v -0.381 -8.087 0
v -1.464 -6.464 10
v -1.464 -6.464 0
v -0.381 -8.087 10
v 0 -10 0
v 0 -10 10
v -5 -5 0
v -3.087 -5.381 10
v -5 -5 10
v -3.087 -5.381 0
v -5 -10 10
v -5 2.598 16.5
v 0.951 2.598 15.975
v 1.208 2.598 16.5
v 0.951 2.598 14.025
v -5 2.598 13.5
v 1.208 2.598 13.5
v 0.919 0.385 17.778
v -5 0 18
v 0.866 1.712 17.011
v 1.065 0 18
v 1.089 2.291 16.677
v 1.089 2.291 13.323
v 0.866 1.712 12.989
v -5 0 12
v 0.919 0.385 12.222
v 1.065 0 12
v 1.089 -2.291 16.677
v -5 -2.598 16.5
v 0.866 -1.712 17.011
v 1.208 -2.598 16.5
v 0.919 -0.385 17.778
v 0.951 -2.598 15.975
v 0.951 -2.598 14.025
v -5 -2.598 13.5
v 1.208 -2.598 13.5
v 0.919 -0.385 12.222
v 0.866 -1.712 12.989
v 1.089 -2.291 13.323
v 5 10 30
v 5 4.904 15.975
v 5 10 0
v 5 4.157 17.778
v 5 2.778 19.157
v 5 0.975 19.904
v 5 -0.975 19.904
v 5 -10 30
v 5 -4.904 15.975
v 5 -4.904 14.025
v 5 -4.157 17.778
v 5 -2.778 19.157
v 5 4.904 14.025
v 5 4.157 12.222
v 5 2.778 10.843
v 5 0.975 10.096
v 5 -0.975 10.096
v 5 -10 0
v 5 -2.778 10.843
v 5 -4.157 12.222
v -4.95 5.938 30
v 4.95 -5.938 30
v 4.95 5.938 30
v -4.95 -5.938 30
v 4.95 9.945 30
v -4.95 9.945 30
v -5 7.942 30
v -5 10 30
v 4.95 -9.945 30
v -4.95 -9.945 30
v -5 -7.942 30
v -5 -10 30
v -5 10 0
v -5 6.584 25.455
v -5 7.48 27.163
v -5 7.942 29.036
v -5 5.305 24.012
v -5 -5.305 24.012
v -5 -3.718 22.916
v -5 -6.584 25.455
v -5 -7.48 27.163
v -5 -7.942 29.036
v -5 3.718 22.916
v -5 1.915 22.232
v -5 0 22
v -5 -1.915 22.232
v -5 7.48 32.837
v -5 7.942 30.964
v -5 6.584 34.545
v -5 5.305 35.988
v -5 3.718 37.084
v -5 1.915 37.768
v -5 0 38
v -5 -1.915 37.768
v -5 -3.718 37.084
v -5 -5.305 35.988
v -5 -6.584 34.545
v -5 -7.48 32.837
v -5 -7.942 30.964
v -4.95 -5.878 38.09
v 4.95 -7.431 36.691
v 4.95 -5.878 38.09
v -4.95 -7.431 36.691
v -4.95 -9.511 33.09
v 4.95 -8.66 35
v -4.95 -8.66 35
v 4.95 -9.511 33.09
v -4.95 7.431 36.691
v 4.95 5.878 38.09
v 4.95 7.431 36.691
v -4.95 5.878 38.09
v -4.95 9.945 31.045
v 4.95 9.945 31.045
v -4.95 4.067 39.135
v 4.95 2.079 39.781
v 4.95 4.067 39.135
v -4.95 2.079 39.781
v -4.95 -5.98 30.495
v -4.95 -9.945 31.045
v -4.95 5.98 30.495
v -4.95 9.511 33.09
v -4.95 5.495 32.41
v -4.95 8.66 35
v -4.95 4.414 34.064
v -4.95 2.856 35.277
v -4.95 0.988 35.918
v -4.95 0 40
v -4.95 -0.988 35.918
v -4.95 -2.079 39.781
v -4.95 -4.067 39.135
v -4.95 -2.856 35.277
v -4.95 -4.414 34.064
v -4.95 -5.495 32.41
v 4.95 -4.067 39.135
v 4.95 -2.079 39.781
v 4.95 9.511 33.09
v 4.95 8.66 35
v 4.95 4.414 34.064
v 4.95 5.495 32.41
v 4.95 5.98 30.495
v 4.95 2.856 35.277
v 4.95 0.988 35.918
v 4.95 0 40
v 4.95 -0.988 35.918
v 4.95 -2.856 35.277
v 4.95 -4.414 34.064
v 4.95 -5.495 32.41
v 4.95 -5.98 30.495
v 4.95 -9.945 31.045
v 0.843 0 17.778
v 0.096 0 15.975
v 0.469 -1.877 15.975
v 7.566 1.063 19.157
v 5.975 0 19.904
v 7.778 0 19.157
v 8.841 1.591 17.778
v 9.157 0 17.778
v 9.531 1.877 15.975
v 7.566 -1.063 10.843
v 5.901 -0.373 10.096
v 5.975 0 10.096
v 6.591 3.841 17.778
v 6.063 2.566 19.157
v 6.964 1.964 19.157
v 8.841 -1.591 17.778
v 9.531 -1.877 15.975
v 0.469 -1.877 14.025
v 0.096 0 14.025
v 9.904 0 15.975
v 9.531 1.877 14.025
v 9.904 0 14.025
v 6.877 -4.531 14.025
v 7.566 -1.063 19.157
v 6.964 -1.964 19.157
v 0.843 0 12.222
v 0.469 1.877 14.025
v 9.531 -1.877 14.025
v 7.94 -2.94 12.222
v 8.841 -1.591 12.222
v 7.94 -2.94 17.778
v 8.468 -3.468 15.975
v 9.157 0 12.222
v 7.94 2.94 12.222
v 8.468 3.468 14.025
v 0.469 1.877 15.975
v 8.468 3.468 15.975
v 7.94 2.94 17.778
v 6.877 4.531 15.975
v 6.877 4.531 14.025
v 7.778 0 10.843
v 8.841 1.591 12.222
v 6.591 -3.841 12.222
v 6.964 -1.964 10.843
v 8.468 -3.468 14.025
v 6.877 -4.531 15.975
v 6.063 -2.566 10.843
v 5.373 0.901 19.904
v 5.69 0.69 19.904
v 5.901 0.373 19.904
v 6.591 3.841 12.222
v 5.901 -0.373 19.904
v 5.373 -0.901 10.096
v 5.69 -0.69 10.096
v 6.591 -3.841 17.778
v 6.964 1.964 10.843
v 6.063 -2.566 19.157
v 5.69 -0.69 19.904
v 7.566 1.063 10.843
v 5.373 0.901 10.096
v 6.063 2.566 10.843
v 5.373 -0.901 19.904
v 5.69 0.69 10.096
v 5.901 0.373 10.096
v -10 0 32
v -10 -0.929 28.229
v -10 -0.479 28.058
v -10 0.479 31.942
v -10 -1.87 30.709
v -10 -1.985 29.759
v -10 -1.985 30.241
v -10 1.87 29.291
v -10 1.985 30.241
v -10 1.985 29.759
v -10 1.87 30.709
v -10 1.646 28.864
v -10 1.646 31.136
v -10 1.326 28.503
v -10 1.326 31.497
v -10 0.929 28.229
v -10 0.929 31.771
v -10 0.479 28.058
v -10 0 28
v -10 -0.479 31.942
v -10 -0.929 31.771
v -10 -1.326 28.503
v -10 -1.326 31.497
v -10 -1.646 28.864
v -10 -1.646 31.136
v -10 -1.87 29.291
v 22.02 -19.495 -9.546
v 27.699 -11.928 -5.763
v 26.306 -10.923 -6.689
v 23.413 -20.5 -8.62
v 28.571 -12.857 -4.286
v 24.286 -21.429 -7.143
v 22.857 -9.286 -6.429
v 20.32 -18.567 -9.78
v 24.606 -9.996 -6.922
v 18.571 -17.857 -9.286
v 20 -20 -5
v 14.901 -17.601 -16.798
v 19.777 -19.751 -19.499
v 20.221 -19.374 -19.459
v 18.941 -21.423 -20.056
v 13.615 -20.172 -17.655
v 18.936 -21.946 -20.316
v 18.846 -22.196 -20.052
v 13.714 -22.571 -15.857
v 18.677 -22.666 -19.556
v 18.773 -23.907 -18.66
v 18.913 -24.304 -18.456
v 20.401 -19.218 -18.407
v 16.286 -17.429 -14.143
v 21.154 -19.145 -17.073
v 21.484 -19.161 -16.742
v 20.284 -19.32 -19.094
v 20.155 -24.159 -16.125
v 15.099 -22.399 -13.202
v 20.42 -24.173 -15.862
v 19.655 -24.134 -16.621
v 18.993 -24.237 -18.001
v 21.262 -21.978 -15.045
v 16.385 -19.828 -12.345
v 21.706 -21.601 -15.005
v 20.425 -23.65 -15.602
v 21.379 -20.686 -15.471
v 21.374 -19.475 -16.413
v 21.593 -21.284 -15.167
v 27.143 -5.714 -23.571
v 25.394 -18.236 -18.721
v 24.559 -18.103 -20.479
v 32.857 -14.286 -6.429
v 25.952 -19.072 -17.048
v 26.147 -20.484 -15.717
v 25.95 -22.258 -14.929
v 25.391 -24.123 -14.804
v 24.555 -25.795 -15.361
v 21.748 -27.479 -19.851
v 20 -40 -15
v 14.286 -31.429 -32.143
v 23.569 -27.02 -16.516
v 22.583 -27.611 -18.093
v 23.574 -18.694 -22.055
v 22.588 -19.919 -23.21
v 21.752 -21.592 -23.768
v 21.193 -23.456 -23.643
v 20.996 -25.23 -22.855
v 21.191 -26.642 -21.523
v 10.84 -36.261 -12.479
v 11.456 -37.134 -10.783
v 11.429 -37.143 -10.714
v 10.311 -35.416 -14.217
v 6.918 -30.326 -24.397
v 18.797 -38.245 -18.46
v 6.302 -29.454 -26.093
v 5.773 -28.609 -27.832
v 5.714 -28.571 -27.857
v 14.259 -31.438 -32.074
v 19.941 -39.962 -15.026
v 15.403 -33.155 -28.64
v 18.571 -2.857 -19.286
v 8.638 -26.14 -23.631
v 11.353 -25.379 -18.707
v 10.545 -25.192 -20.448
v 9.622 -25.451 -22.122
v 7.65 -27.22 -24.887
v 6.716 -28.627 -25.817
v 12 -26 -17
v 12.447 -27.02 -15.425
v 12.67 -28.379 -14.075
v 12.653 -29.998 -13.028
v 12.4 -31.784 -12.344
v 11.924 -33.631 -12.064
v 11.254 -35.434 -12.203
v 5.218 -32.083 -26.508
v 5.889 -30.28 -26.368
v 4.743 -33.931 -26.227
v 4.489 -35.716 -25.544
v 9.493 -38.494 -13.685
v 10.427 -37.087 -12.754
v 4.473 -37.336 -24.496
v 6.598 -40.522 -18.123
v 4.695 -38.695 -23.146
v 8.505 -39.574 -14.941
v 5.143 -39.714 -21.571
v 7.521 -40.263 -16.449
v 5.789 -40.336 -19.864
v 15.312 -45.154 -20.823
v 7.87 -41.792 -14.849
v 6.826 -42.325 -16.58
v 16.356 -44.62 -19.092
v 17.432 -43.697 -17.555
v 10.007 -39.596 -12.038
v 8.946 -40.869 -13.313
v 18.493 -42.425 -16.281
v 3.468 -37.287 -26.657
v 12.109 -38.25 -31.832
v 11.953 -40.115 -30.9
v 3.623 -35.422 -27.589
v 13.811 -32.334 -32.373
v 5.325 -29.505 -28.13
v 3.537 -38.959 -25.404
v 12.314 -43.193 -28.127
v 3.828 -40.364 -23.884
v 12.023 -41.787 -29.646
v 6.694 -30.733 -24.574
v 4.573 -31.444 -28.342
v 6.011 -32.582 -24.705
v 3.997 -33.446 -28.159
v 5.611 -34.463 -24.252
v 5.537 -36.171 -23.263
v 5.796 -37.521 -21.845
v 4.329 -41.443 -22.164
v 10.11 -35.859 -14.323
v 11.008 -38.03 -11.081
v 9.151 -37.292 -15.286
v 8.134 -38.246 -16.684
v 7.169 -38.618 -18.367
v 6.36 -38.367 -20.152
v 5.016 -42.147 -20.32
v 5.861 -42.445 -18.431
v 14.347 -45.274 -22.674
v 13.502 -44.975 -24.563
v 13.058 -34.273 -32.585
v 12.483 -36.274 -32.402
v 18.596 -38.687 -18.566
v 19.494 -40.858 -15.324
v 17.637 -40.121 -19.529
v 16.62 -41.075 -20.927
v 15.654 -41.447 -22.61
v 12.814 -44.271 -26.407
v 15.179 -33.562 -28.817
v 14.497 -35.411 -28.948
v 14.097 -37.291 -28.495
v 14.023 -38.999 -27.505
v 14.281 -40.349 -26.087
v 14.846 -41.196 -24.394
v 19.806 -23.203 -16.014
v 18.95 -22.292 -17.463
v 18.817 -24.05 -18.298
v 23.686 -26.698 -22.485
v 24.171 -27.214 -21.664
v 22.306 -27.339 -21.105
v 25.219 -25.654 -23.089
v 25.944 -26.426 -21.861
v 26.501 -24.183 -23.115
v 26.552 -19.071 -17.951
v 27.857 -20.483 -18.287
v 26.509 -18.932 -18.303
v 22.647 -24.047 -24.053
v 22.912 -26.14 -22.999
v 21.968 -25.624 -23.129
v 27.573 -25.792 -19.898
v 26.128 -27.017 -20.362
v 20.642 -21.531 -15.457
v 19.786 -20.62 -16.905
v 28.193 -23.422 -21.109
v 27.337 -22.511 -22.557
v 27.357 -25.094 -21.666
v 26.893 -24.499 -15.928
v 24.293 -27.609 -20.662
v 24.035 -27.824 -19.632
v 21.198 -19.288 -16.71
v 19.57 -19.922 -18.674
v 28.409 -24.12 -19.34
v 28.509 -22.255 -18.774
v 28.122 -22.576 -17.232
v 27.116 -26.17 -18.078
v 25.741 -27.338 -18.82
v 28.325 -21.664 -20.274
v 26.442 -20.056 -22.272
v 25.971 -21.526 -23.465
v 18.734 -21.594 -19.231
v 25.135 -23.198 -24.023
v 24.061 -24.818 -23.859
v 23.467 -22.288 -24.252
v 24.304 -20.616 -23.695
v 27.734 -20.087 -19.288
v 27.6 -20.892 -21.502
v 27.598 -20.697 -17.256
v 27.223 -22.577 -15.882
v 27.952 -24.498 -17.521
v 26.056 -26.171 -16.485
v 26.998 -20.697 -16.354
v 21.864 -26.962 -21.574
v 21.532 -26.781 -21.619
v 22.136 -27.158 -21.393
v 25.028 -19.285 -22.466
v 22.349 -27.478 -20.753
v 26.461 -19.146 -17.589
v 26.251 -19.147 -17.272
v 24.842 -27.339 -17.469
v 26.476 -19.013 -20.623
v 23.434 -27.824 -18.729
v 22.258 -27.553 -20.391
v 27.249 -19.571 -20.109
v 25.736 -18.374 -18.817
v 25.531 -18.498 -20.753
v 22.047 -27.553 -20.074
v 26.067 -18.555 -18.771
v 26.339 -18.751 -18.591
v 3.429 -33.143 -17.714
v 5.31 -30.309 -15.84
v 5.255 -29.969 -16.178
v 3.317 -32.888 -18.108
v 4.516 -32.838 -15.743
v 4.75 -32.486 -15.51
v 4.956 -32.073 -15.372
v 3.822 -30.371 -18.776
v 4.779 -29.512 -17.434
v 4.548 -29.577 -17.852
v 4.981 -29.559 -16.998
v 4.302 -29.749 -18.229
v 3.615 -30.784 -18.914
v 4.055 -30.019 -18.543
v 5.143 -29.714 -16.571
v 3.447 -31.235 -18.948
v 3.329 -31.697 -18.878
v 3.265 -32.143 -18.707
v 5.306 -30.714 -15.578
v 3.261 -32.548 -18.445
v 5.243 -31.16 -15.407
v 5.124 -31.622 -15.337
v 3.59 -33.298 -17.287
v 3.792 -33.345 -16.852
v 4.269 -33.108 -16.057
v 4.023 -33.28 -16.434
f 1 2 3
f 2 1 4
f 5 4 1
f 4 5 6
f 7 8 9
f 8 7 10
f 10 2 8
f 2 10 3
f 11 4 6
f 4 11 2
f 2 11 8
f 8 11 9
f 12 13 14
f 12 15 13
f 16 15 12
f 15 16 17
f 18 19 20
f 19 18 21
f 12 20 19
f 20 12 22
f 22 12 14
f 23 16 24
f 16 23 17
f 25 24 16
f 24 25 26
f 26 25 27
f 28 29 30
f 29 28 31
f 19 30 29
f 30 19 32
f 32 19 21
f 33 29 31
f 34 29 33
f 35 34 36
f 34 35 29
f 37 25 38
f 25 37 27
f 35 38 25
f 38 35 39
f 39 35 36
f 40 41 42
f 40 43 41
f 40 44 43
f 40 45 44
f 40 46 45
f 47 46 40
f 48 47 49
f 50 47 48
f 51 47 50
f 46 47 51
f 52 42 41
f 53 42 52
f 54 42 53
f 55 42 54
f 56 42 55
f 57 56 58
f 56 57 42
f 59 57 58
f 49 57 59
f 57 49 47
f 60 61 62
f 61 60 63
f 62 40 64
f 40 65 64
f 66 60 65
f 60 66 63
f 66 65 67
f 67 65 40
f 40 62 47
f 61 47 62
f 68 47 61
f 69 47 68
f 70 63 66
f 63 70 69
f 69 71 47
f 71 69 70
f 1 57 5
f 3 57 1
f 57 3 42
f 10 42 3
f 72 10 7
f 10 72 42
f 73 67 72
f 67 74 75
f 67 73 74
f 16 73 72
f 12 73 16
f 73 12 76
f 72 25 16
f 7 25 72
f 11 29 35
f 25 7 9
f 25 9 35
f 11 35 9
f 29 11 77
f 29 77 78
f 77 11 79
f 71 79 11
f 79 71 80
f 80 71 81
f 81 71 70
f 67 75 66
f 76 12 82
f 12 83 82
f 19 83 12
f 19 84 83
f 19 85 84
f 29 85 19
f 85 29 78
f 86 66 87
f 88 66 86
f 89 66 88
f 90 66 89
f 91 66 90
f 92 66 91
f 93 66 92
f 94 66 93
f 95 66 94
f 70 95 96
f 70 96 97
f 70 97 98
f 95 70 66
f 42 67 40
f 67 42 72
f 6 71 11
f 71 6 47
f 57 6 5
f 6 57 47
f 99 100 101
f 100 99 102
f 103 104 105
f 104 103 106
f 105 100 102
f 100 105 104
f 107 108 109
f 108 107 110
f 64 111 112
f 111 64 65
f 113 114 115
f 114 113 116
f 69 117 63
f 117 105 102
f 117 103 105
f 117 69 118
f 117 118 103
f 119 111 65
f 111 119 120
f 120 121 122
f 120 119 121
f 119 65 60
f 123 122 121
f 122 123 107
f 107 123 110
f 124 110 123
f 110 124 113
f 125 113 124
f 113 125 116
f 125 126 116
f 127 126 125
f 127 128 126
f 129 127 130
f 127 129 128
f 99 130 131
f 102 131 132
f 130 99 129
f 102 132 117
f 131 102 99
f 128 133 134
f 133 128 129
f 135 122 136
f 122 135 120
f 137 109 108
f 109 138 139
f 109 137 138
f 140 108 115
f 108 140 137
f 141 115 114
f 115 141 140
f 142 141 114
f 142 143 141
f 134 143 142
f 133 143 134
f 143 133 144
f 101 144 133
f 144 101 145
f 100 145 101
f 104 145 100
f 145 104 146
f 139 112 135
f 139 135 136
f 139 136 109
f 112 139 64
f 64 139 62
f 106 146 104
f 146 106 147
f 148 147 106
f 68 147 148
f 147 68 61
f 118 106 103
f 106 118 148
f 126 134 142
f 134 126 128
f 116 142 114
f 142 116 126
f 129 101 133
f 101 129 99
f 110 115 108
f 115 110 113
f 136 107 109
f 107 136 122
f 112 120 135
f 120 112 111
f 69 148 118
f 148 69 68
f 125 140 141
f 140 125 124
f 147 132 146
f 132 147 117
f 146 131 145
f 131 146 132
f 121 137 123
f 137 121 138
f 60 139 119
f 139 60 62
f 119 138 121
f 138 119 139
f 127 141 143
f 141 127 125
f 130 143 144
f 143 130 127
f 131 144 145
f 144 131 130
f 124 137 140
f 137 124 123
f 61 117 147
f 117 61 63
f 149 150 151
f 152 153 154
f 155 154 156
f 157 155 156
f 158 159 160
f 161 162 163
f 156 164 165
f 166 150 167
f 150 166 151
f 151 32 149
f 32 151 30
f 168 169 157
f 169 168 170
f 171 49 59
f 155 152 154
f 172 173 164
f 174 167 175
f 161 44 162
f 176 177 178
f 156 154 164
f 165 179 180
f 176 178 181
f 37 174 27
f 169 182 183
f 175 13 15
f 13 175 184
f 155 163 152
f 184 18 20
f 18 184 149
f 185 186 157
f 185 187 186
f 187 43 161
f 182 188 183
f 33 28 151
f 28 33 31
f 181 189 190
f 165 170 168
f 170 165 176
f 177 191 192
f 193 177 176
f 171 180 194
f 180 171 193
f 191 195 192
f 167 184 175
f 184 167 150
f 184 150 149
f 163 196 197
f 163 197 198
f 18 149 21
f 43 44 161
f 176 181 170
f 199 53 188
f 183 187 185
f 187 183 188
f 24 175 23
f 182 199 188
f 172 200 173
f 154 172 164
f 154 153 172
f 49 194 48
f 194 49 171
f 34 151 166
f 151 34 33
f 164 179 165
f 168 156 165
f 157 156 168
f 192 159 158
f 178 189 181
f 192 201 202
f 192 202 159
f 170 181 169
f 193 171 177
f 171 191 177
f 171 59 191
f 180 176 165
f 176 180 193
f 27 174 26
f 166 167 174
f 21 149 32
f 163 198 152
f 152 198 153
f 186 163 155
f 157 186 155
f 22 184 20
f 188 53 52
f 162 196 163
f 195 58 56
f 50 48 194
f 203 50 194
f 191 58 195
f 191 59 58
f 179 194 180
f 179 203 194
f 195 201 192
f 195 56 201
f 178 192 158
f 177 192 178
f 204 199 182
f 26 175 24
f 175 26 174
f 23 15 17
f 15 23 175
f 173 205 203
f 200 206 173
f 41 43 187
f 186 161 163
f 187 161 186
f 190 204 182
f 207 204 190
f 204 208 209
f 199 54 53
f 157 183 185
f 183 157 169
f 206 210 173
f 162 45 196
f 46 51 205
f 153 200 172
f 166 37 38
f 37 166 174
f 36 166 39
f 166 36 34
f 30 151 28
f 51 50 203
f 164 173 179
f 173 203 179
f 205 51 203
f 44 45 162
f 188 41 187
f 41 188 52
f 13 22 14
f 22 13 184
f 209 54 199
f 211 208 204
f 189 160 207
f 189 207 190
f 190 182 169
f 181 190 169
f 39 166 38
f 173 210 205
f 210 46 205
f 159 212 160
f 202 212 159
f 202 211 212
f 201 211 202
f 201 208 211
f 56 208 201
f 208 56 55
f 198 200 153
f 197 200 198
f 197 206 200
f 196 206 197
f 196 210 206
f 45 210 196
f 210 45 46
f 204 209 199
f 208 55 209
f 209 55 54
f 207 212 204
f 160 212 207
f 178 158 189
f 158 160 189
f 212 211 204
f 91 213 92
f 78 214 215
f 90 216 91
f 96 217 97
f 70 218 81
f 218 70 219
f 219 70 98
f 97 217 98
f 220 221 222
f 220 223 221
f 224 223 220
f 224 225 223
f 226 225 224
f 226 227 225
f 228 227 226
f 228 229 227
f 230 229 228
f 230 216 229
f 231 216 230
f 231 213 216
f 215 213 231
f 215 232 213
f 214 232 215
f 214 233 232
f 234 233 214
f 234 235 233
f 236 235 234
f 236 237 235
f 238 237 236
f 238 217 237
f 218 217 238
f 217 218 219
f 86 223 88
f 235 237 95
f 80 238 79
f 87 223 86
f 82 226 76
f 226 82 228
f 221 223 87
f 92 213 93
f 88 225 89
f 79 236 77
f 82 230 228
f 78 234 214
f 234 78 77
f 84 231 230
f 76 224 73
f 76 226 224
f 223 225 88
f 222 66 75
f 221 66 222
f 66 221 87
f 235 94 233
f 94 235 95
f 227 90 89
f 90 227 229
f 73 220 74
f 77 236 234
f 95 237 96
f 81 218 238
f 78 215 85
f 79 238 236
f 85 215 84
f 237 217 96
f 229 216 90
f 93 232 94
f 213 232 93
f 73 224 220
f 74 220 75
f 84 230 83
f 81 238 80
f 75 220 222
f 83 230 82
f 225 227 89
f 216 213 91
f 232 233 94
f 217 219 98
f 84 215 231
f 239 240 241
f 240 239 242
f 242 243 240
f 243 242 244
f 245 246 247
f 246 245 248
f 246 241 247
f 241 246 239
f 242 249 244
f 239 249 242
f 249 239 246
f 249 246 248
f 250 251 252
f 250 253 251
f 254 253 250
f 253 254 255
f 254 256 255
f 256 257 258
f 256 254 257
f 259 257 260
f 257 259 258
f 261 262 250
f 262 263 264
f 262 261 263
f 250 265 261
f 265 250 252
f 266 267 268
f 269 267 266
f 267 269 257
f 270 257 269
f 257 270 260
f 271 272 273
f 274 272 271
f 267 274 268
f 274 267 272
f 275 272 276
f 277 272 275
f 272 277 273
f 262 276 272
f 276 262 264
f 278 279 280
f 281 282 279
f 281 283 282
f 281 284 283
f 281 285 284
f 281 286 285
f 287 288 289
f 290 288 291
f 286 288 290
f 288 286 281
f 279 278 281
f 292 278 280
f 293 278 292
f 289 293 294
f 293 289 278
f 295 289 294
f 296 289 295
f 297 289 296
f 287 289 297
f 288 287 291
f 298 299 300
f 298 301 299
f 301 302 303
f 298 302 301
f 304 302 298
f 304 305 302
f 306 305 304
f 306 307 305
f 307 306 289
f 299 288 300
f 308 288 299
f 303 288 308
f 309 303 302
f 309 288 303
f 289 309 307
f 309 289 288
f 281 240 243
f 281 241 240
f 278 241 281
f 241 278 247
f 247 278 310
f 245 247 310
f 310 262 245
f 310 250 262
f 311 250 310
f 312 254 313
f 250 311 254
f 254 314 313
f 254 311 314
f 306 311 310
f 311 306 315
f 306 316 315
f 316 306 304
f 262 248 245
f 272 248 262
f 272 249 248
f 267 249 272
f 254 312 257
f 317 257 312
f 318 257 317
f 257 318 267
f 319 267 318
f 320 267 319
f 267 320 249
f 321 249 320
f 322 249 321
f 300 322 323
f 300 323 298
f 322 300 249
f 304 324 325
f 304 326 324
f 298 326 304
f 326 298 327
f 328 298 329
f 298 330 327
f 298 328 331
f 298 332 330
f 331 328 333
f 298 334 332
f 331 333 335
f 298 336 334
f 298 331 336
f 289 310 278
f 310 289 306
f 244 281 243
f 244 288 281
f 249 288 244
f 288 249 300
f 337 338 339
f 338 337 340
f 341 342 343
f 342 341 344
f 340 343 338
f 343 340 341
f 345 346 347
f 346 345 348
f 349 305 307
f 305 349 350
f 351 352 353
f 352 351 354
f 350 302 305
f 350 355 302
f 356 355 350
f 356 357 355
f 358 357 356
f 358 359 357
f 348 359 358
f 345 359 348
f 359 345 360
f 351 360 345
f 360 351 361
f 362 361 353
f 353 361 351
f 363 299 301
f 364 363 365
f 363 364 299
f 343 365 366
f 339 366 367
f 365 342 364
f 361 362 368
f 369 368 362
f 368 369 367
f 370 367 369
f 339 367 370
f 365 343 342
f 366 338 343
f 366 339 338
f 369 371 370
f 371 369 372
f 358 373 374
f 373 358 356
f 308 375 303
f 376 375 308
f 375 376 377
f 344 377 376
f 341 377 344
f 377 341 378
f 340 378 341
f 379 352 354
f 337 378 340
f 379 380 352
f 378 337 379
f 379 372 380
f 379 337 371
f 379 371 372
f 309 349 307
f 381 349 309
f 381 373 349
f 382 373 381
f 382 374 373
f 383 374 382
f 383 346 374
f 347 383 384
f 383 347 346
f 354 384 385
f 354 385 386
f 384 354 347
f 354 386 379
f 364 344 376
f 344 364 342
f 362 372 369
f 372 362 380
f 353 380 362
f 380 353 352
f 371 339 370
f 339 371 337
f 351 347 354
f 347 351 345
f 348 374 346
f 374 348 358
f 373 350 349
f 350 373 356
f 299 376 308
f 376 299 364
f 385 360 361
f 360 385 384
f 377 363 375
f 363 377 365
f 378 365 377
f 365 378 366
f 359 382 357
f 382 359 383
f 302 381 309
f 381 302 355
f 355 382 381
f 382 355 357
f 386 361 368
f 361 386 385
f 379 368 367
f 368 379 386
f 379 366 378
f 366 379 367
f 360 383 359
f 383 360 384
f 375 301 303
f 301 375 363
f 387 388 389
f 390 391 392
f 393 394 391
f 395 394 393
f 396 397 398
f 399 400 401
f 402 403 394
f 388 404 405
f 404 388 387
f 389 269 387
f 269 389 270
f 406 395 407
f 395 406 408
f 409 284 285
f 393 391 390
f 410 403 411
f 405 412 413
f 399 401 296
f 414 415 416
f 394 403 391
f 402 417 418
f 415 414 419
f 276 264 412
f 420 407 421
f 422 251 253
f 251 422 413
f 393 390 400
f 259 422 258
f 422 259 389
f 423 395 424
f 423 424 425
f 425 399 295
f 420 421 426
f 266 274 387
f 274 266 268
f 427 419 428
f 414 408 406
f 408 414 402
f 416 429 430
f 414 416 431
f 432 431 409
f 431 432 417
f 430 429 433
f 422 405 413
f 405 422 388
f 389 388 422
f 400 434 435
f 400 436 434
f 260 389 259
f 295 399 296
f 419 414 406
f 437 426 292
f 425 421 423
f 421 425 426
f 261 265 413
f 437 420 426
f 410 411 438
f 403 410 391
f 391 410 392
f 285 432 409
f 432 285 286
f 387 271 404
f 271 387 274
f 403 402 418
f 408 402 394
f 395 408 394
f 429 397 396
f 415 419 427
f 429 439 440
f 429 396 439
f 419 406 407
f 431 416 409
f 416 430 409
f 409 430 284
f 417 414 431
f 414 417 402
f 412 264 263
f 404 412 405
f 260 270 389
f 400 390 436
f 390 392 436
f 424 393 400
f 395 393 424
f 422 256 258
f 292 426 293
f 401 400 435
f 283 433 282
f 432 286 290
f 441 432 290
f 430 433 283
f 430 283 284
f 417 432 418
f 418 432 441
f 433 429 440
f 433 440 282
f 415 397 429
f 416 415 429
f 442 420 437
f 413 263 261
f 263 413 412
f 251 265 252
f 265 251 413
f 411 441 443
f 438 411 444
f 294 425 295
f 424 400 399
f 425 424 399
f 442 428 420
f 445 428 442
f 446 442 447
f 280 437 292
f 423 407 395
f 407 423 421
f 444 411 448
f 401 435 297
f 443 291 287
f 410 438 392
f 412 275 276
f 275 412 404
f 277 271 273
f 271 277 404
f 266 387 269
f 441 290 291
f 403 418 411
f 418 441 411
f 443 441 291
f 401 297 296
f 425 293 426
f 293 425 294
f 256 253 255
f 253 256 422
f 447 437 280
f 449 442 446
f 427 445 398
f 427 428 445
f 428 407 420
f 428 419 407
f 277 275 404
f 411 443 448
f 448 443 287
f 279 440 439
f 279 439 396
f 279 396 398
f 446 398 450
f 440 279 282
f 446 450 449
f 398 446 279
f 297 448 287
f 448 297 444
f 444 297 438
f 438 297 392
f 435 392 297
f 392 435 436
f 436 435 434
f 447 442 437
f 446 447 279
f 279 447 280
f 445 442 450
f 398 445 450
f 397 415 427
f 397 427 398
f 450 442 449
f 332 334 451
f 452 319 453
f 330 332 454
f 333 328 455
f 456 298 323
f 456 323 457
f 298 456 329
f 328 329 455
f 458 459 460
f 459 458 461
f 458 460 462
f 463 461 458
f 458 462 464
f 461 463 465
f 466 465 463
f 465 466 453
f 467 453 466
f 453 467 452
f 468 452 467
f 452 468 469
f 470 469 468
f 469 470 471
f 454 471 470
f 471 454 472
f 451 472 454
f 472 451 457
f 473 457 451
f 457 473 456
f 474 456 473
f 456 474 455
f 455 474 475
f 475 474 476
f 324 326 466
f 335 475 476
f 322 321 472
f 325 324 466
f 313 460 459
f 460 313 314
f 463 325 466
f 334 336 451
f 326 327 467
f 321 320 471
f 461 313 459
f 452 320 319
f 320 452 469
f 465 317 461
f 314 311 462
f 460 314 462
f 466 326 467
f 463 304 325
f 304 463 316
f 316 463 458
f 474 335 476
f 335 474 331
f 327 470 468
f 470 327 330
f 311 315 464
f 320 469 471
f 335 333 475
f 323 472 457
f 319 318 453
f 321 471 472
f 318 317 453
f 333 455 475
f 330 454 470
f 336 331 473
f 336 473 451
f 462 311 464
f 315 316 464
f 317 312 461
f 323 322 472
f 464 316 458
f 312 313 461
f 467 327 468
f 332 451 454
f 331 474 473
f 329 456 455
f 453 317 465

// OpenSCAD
/*  Copyright 2014 Pieter Gosselink
    This program is free software: you can redistribute it and/or modify
    it under the terms of the GNU General Public License as published by
    the Free Software Foundation, either version 3 of the License, or
    (at your option) any later version.

    This program is distributed in the hope that it will be useful,
    but WITHOUT ANY WARRANTY; without even the implied warranty of
    MERCHANTABILITY or FITNESS FOR A PARTICULAR PURPOSE.  See the
    GNU General Public License for more details.

    You should have received a copy of the GNU General Public License
    along with this program.  If not, see <http://www.gnu.org/licenses/>.
*/    
povray_gen=1;

openscad_vpr = $vpr;
openscad_vpt = $vpt;
openscad_vpd = 500; // openscad issue #839;
openscad_vpw = 800;
openscad_vph = 450;

indentstr="  ";

mapped_functions = [["translate"], ["rotate"], ["scale"], ["multmatrix"], ["color"], ["group"], ["union"], ["difference"], ["intersection"]];

function indentdelta(n) = (n[0] != "_" ? "" : n[1]!= "_" ? indentstr : ""); // only modules starting with a single '_' will indent
function indent(i) = i>0 ? str(indentdelta(parent_module(i-1)),indent(i-1)) : ""; // construct indent string based on stack
function strvd(v,i) = str(",",v[i],(len(v)-1==i ? ">" : strvd(v,i+1))); // build povray vector
function strv(v) = len(v)==undef ? v : str("<",v[0],strvd(v,1));
function color(c) = len(c) == undef ? c : str("color rgb",(len(c)==4 ? "t " : " "),strv(c));
function pigment(p) = str("pigment {",color(p),"}");
module printstack() {for (i=[0:$parent_modules-1]) echo(parent_module(i));}

function mapped_function_used(i) = 
(
  i < $parent_modules ? (parent_module(i)[0] != "_" && search([parent_module(i)],mapped_functions) != undef
  ) || 
  mapped_function_used(i+1) 
  :
  false
);

// modules to print out the pov-ray code

povray_code = "POVRAY:";


module pov(s,c) // s = string to print out, c = optional end of line comment
{
    /*if (mapped_function_used(0)) 
    {
       printstack();
       echo("$$$$$$$$$$$$$$$$$$$$$$$$$$");
    }*/   
    if ($children==0) 
    {
        if (povray_gen) echo(str(povray_code, s, (s=="" ? "" : " "), (c==undef ? "" : str("// ",c))));
    }
    else
    {
        echo(str("#### missing semicolon after pov(",s,c==undef ? "" : str(",",c),") in '",parent_module(1),"'"));       
    }    
}       
module povc(c) pov("",c); // a single line of comment
module pove(e) pov(str("##### ERROR #####: ", e)); 

function parameter(n,v) = (v == undef ? str("  /* ",n, " not defined*/") : str("  ", n, " ",v, "  "));

module pov_init()
{
   pov("#version  3.7;");
   povc("created from OpenSCAD");
   pov("global_settings { assumed_gamma 1.9 }");
   pov(str("#default { texture { pigment { rgb <1,1,0> } finish { ambient 0.15 diffuse 0.85} } }"));
   pov("");
}  

// POV-Ray

module pov_declare(n,v,c) pov(str("#declare ",n," = ",v,";"),c);
module pov_background(c="<0,0,0>") pov(str("background { ", c, " }")); 

module pov_camera(type,location,right,angle,up,rotate,translate,look_at)
{
   pov("camera {");
   pov(str("  ",type));
   pov(parameter("location",location));
   pov(parameter("right", right));
   pov(parameter("angle", angle));
   pov(parameter("up",up));
   pov(parameter("rotate",rotate));
   pov(parameter("translate", translate));
   pov(parameter("look_at", look_at));
   pov("}");
   pov("");
}

module pov_light_source(location,color,m="",translate,rotate)
{
   pov("light_source {");
   pov(str("  ", location, " ", color));
   if (m!= "") pov(m);
   pov(parameter("rotate",rotate));
   pov(parameter("translate", translate));
   pov("}");   
}

// OpenSCAD 

module openscad_background(c="openscad_cornfield")
{
   povc("** OpenSCAD background colors **");
   pov_declare("openscad_cornfield",color([255,255,229]/255));
   pov_declare("openscad_metalic",color([170,170,255]/255));
   pov_declare("openscad_sunset",color([170,68,68]/255));
   pov_background(c=c);
   pov("");
}
  
module openscad_camera(type="perspective", distance=openscad_vpd, width=openscad_vpw, heigth=openscad_vph)
{
    povc("** OpenSCAD View Port defnition **");
    pov_declare("openscad_vpt",strv(openscad_vpt));
    pov_declare("openscad_vpr",strv(openscad_vpr));
    // view port distance is not available as special variable (https://github.com/openscad/openscad/issues/839)
    pov_declare("openscad_vpd",distance,"Please set manually"); 
    pov_declare("openscad_vpw",width);
    pov_declare("openscad_vph",heigth);   
    
    pov("#macro openscad_camera_angle(w ,h) (11*pow(w/h,0.5)) #end","OpenSCAD camera angle is dependent on view port aspect ratio. Formula is an estimation");
    pov_camera(
        type =  type,
        location = strv([0,0,"openscad_vpd"]),
        right = strv(["-openscad_vpw/openscad_vph",0,0]),
        angle = "openscad_camera_angle(openscad_vpw,openscad_vph)",
        up = strv([0,0,1]),
        rotate = "openscad_vpr",
        translate = "openscad_vpt",
        look_at = strv([0,0,0])
    );
}

module openscad_light_source()
{
    povc("** OpenSCAD light sources. The location depends on the view port definition **");
    pov_light_source(str(strv([-1,1,1]),"*openscad_vpd"), color([1,1,1]), rotate="openscad_vpr", translate="openscad_vpt");  
    pov_light_source(str(strv([1,-1,-1]),"*openscad_vpd"), color([1,1,1]), rotate="openscad_vpr", translate="openscad_vpt");   
    /*union() { // default vpd, as $vpd does not exist (yet)
        rotate($vpr) translate([-1,1,1]*500+$vpt) sphere(r=10);
        rotate($vpr) translate([1,-1,-1]*500+$vpt) sphere(r=10);
    }*/
    pov("");
}

module openscad_axes(crosshairs=0)
{
    _union()
    {
        _color([1,0,0]) _rotate([0,90,0]) _translate([0,0,4+25]) _cube(size=[2,2,50],center=true);
        _color([0,1,0]) _rotate([-90,0,0]) _translate([0,0,4+25])_cube(size=[4,4,50],center=true);
        _color([0,0,1]) _rotate([0,0,0]) _translate([0,0,4+25]) _cube(size=[8,8,50],center=true);
        _color([1,1,1]) _translate([54,0,0]) _sphere(r=1,$fn=8);
        _color([1,1,1]) _translate([0,54,0]) _sphere(r=2,$fn=8);
        _color([1,1,1]) _translate([0,0,54]) _sphere(r=4,$fn=8);
        if (crosshairs)
        {
            _color([0.2,0.2,0.2]) _rotate([-90+atan(sqrt(2)/2),0,45]) _cylinder(r=1,h=100,center=true);
            _color([0.2,0.2,0.2]) _rotate([-90+atan(sqrt(2)/2),0,-45]) _cylinder(r=1,h=100,center=true);
            _color([0.2,0.2,0.2]) _rotate([90-atan(sqrt(2)/2),0,45]) _cylinder(r=1,h=100,center=true);
            _color([0.2,0.2,0.2]) _rotate([90-atan(sqrt(2)/2),0,-45]) _cylinder(r=1,h=100,center=true);
        }    
    }
}   

module openscad2povray_init()
{
    pov_init();
    openscad_background();
    openscad_camera();
    openscad_light_source();
}



module _cube(size = [1, 1, 1], center = false)
{
    cube(size,center);
    assign(psize = (len(size)==undef ? [size,size,size] : size))
    {
        pov(str(
            indent($parent_modules),
            "box {",
            center ? strv(-psize/2) : strv([0,0,0]),",",
            strv(psize/(center ? 2 : 1)),
            "}"
        ));
    }
}

module _sphere(r=1)
{
    sphere(r=r);
    if ($fn>0 && $fn<30) povc(str("ignored $fn value:", $fn));
    pov(str(
        indent($parent_modules),
        "sphere {<0,0,0>, ",
        r,
        "}"
    ));
}

module __multisided_cone(r1,r2,h,center)
{  
    if (r1 != r2) pove(str("unhandled tapered multisided cone:",r1,"/",r2,"/",h));
    pov(str(indent($parent_modules),"intersection { // ",$fn,"-sided cylinder"));
    for (i = [0:$fn-1])
    {
        pov(str(indent($parent_modules),indentstr,"plane {x, ",cos(180/$fn)*r1," rotate ", strv([0,0,(i + 0.5)*360/$fn]),"}"));
    }
    // top & bottom plane
    pov(str(indent($parent_modules),indentstr,"plane {z, ",(center ? h/2 : h),"}"));
    pov(str(indent($parent_modules),indentstr,"plane {-z, ",(center ? h/2 : 0),"}"));
    pov(str(indent($parent_modules),"}"));
    //pov(str(" bounded_by {sphere{0, 1.5}}"));
}

module _cylinder(r1,r2,r = 1,h = 1, center = false)
{
    assign(r1 = (r1==undef ? r : r1), r2 = (r2 == undef ? r : r2))
    {
        cylinder(r1=r1,r2=r2,h=h,center=center);
        if ($fn>0 && $fn<30) 
            __multisided_cone(r1,r2,h,center);
        else
        {
            pov(str(
                indent($parent_modules),
                "cone {", 
                strv(center ? [0,0,-h/2] : [0,0,0]), ",",
                (r1==undef?r:r1), strv(center ? [0,0,h/2] : [0,0,h]), ",", 
                (r2==undef?r:r2),
                "}"
            ));
        }
    }  
}

module _polyhedron(points,faces) // ONLY: Convex polygons
{
    polyhedron(points,faces);
    pov(str(indent($parent_modules),"mesh { "));
    for(i=[0:len(faces)-1])
    {
        for(j=[2:len(faces[i])-1])
        {
            pov(str(
                indent($parent_modules),
                "triangle {",
                strv(points[faces[i][0]]),",",
                strv(points[faces[i][j-1]]),",",
                strv(points[faces[i][j]]),"}"
            ));
        }
    }
    pov(indent($parent_modules),str("}"));
}

module __object_open(type,children,comment)
{
  pov(str(indent($parent_modules), children==1 ? "object" : "union" , " { ",comment));
}

module __object_close(type,code)
{
  pov(str(indent($parent_modules),indentstr,type," ",code));
  pov(str(indent($parent_modules),"}")); 
}

module _translate(v,c="")
{
  __object_open("translate",$children,c);
  translate(v) { children([0:$children-1]); }
  __object_close("translate",strv(v));
}

module _rotate(v,c="")
{
  __object_open("rotate",$children,c);
  rotate(v) { children([0:$children-1]); }
  __object_close("rotate",strv(v));
}

module _scale(v,c="")
{
  __object_open("scale", $children,c);
  scale(v) { children([0:$children-1]); }
  __object_close("scale",strv(v));
}

module _multmatrix(m,c="")
{
  __object_open("multimatrix", $children,c);
  multmatrix(m) { children([0:$children-1]); }
  __object_close("matrix",strv([m[0][0],m[1][0],m[2][0],m[0][1],m[1][1],m[2][1],m[0][2],m[1][2],m[2][2],m[0][3],m[1][3],m[2][3]]));
}

module _mirror(v)
{
    function _mirror_multmatrix(v) = [
        [1-2*v[0]*v[0],0-2*v[0]*v[1],0-2*v[0]*v[2],0],
        [0-2*v[0]*v[1],1-2*v[1]*v[1],0-2*v[1]*v[2],0],
        [0-2*v[0]*v[2],0-2*v[1]*v[2],1-2*v[2]*v[2],0]];
    _multmatrix(_mirror_multmatrix(v/norm(v))) { children([0:$children-1]); }
}

module _color(v,c="")
{
  __object_open("color",$children,c);
  color(v) { children([0:$children-1]); }
  __object_close("",pigment([v[0],v[1],v[2],len(v)==4 ? 1-v[3] : 0]));
}

module _render(convexity)
{
    render(convexity) { children([0:$children-1]); }
}

module _difference(c="")
{
  //echo("diff",1,$children-1);
  pov(str(indent($parent_modules),"difference { ", c));
  difference() { children(0); if ($children>1) children([1:$children-1]); }
  pov(str(indent($parent_modules),"} ", c));
}

module _intersection(c="")
{
    pov(str(indent($parent_modules),"intersection { ", c));
    intersection() 
    {
        children(0);
        if ($children>1) children(1);
        if ($children>2) children(2);
        if ($children>3) children(3);
        if ($children>4) pove("Not enough child entries in _intersection module");
    }
  pov(str(indent($parent_modules),"} ", c));
}

module _union(c="")
{
  //echo("union",0,$children-1);
  pov(str(indent($parent_modules), "union { ", c));
  union() { children([0:$children-1]); }
  pov(str(indent($parent_modules),"} ", c));
}

module _group()
{
  pov(str(indent($parent_modules), "union { "));
  if ($children>0) group() { children([0:$children-1]); }
  pov(str(indent($parent_modules),"}"));
}

/////////////////////////////////////////////////////////////////


module test1() // transparency/color test
{
    _union()
    {
        _difference()
        {
            _union()
            {
                _color([1,0,0]) _cube(size=[20,20,20],center=true);
                _color([0,1,0,.2]) _translate([5,5,10]) _sphere(r=5);
            }
            _translate([-5,5,10]) _cylinder(r=5,h=10,center=true);
        }        
         _color([0.5,1,0.5]) _translate([100,0,-1]) _cube(size=[200,200,2],center=true);
         for (x=[0:10:199])
            for (y=[0:10:199])
               _color([x/200,0,1-x/200,(y+9)/200]) _translate([x+5,-100+y+5,0]) _sphere(r=3);
               
    }
}

module test2() 
{
    _translate([-5,-10,0]) 
    _union()
    {
        _color([1,0.5,0.5]) _difference()
        {
            _cube(size=[10,20,30]);
            _cylinder(r=5,h=20,center=true);
            _translate([5,10,15]) _rotate([0,90,0]) _cylinder(r=3,h=11,$fn=6,center=true);
        }
        _translate ([10,10,15]) _color ([0.5,0.5,1,.8]) _sphere(r=5);
        _translate([0.05,10,30]) _rotate([0,90,0]) _color([0.2,1,.2,.8]) 
        _difference()
        {
            _cylinder(r=10,h=9.9);
            _translate([0,0,-0.5]) _cylinder(r=6,h=11);
        }
        _translate([0,10,30]) _rotate([0,-90,0]) _color([1,0,1,0.2]) _cylinder(r1=8,r2=2,h=5);
    }
}

module test()
{
  openscad2povray_init();
  test2();
  _mirror([1,2,3]) _translate([30,0,0]) test2();
}

test();
